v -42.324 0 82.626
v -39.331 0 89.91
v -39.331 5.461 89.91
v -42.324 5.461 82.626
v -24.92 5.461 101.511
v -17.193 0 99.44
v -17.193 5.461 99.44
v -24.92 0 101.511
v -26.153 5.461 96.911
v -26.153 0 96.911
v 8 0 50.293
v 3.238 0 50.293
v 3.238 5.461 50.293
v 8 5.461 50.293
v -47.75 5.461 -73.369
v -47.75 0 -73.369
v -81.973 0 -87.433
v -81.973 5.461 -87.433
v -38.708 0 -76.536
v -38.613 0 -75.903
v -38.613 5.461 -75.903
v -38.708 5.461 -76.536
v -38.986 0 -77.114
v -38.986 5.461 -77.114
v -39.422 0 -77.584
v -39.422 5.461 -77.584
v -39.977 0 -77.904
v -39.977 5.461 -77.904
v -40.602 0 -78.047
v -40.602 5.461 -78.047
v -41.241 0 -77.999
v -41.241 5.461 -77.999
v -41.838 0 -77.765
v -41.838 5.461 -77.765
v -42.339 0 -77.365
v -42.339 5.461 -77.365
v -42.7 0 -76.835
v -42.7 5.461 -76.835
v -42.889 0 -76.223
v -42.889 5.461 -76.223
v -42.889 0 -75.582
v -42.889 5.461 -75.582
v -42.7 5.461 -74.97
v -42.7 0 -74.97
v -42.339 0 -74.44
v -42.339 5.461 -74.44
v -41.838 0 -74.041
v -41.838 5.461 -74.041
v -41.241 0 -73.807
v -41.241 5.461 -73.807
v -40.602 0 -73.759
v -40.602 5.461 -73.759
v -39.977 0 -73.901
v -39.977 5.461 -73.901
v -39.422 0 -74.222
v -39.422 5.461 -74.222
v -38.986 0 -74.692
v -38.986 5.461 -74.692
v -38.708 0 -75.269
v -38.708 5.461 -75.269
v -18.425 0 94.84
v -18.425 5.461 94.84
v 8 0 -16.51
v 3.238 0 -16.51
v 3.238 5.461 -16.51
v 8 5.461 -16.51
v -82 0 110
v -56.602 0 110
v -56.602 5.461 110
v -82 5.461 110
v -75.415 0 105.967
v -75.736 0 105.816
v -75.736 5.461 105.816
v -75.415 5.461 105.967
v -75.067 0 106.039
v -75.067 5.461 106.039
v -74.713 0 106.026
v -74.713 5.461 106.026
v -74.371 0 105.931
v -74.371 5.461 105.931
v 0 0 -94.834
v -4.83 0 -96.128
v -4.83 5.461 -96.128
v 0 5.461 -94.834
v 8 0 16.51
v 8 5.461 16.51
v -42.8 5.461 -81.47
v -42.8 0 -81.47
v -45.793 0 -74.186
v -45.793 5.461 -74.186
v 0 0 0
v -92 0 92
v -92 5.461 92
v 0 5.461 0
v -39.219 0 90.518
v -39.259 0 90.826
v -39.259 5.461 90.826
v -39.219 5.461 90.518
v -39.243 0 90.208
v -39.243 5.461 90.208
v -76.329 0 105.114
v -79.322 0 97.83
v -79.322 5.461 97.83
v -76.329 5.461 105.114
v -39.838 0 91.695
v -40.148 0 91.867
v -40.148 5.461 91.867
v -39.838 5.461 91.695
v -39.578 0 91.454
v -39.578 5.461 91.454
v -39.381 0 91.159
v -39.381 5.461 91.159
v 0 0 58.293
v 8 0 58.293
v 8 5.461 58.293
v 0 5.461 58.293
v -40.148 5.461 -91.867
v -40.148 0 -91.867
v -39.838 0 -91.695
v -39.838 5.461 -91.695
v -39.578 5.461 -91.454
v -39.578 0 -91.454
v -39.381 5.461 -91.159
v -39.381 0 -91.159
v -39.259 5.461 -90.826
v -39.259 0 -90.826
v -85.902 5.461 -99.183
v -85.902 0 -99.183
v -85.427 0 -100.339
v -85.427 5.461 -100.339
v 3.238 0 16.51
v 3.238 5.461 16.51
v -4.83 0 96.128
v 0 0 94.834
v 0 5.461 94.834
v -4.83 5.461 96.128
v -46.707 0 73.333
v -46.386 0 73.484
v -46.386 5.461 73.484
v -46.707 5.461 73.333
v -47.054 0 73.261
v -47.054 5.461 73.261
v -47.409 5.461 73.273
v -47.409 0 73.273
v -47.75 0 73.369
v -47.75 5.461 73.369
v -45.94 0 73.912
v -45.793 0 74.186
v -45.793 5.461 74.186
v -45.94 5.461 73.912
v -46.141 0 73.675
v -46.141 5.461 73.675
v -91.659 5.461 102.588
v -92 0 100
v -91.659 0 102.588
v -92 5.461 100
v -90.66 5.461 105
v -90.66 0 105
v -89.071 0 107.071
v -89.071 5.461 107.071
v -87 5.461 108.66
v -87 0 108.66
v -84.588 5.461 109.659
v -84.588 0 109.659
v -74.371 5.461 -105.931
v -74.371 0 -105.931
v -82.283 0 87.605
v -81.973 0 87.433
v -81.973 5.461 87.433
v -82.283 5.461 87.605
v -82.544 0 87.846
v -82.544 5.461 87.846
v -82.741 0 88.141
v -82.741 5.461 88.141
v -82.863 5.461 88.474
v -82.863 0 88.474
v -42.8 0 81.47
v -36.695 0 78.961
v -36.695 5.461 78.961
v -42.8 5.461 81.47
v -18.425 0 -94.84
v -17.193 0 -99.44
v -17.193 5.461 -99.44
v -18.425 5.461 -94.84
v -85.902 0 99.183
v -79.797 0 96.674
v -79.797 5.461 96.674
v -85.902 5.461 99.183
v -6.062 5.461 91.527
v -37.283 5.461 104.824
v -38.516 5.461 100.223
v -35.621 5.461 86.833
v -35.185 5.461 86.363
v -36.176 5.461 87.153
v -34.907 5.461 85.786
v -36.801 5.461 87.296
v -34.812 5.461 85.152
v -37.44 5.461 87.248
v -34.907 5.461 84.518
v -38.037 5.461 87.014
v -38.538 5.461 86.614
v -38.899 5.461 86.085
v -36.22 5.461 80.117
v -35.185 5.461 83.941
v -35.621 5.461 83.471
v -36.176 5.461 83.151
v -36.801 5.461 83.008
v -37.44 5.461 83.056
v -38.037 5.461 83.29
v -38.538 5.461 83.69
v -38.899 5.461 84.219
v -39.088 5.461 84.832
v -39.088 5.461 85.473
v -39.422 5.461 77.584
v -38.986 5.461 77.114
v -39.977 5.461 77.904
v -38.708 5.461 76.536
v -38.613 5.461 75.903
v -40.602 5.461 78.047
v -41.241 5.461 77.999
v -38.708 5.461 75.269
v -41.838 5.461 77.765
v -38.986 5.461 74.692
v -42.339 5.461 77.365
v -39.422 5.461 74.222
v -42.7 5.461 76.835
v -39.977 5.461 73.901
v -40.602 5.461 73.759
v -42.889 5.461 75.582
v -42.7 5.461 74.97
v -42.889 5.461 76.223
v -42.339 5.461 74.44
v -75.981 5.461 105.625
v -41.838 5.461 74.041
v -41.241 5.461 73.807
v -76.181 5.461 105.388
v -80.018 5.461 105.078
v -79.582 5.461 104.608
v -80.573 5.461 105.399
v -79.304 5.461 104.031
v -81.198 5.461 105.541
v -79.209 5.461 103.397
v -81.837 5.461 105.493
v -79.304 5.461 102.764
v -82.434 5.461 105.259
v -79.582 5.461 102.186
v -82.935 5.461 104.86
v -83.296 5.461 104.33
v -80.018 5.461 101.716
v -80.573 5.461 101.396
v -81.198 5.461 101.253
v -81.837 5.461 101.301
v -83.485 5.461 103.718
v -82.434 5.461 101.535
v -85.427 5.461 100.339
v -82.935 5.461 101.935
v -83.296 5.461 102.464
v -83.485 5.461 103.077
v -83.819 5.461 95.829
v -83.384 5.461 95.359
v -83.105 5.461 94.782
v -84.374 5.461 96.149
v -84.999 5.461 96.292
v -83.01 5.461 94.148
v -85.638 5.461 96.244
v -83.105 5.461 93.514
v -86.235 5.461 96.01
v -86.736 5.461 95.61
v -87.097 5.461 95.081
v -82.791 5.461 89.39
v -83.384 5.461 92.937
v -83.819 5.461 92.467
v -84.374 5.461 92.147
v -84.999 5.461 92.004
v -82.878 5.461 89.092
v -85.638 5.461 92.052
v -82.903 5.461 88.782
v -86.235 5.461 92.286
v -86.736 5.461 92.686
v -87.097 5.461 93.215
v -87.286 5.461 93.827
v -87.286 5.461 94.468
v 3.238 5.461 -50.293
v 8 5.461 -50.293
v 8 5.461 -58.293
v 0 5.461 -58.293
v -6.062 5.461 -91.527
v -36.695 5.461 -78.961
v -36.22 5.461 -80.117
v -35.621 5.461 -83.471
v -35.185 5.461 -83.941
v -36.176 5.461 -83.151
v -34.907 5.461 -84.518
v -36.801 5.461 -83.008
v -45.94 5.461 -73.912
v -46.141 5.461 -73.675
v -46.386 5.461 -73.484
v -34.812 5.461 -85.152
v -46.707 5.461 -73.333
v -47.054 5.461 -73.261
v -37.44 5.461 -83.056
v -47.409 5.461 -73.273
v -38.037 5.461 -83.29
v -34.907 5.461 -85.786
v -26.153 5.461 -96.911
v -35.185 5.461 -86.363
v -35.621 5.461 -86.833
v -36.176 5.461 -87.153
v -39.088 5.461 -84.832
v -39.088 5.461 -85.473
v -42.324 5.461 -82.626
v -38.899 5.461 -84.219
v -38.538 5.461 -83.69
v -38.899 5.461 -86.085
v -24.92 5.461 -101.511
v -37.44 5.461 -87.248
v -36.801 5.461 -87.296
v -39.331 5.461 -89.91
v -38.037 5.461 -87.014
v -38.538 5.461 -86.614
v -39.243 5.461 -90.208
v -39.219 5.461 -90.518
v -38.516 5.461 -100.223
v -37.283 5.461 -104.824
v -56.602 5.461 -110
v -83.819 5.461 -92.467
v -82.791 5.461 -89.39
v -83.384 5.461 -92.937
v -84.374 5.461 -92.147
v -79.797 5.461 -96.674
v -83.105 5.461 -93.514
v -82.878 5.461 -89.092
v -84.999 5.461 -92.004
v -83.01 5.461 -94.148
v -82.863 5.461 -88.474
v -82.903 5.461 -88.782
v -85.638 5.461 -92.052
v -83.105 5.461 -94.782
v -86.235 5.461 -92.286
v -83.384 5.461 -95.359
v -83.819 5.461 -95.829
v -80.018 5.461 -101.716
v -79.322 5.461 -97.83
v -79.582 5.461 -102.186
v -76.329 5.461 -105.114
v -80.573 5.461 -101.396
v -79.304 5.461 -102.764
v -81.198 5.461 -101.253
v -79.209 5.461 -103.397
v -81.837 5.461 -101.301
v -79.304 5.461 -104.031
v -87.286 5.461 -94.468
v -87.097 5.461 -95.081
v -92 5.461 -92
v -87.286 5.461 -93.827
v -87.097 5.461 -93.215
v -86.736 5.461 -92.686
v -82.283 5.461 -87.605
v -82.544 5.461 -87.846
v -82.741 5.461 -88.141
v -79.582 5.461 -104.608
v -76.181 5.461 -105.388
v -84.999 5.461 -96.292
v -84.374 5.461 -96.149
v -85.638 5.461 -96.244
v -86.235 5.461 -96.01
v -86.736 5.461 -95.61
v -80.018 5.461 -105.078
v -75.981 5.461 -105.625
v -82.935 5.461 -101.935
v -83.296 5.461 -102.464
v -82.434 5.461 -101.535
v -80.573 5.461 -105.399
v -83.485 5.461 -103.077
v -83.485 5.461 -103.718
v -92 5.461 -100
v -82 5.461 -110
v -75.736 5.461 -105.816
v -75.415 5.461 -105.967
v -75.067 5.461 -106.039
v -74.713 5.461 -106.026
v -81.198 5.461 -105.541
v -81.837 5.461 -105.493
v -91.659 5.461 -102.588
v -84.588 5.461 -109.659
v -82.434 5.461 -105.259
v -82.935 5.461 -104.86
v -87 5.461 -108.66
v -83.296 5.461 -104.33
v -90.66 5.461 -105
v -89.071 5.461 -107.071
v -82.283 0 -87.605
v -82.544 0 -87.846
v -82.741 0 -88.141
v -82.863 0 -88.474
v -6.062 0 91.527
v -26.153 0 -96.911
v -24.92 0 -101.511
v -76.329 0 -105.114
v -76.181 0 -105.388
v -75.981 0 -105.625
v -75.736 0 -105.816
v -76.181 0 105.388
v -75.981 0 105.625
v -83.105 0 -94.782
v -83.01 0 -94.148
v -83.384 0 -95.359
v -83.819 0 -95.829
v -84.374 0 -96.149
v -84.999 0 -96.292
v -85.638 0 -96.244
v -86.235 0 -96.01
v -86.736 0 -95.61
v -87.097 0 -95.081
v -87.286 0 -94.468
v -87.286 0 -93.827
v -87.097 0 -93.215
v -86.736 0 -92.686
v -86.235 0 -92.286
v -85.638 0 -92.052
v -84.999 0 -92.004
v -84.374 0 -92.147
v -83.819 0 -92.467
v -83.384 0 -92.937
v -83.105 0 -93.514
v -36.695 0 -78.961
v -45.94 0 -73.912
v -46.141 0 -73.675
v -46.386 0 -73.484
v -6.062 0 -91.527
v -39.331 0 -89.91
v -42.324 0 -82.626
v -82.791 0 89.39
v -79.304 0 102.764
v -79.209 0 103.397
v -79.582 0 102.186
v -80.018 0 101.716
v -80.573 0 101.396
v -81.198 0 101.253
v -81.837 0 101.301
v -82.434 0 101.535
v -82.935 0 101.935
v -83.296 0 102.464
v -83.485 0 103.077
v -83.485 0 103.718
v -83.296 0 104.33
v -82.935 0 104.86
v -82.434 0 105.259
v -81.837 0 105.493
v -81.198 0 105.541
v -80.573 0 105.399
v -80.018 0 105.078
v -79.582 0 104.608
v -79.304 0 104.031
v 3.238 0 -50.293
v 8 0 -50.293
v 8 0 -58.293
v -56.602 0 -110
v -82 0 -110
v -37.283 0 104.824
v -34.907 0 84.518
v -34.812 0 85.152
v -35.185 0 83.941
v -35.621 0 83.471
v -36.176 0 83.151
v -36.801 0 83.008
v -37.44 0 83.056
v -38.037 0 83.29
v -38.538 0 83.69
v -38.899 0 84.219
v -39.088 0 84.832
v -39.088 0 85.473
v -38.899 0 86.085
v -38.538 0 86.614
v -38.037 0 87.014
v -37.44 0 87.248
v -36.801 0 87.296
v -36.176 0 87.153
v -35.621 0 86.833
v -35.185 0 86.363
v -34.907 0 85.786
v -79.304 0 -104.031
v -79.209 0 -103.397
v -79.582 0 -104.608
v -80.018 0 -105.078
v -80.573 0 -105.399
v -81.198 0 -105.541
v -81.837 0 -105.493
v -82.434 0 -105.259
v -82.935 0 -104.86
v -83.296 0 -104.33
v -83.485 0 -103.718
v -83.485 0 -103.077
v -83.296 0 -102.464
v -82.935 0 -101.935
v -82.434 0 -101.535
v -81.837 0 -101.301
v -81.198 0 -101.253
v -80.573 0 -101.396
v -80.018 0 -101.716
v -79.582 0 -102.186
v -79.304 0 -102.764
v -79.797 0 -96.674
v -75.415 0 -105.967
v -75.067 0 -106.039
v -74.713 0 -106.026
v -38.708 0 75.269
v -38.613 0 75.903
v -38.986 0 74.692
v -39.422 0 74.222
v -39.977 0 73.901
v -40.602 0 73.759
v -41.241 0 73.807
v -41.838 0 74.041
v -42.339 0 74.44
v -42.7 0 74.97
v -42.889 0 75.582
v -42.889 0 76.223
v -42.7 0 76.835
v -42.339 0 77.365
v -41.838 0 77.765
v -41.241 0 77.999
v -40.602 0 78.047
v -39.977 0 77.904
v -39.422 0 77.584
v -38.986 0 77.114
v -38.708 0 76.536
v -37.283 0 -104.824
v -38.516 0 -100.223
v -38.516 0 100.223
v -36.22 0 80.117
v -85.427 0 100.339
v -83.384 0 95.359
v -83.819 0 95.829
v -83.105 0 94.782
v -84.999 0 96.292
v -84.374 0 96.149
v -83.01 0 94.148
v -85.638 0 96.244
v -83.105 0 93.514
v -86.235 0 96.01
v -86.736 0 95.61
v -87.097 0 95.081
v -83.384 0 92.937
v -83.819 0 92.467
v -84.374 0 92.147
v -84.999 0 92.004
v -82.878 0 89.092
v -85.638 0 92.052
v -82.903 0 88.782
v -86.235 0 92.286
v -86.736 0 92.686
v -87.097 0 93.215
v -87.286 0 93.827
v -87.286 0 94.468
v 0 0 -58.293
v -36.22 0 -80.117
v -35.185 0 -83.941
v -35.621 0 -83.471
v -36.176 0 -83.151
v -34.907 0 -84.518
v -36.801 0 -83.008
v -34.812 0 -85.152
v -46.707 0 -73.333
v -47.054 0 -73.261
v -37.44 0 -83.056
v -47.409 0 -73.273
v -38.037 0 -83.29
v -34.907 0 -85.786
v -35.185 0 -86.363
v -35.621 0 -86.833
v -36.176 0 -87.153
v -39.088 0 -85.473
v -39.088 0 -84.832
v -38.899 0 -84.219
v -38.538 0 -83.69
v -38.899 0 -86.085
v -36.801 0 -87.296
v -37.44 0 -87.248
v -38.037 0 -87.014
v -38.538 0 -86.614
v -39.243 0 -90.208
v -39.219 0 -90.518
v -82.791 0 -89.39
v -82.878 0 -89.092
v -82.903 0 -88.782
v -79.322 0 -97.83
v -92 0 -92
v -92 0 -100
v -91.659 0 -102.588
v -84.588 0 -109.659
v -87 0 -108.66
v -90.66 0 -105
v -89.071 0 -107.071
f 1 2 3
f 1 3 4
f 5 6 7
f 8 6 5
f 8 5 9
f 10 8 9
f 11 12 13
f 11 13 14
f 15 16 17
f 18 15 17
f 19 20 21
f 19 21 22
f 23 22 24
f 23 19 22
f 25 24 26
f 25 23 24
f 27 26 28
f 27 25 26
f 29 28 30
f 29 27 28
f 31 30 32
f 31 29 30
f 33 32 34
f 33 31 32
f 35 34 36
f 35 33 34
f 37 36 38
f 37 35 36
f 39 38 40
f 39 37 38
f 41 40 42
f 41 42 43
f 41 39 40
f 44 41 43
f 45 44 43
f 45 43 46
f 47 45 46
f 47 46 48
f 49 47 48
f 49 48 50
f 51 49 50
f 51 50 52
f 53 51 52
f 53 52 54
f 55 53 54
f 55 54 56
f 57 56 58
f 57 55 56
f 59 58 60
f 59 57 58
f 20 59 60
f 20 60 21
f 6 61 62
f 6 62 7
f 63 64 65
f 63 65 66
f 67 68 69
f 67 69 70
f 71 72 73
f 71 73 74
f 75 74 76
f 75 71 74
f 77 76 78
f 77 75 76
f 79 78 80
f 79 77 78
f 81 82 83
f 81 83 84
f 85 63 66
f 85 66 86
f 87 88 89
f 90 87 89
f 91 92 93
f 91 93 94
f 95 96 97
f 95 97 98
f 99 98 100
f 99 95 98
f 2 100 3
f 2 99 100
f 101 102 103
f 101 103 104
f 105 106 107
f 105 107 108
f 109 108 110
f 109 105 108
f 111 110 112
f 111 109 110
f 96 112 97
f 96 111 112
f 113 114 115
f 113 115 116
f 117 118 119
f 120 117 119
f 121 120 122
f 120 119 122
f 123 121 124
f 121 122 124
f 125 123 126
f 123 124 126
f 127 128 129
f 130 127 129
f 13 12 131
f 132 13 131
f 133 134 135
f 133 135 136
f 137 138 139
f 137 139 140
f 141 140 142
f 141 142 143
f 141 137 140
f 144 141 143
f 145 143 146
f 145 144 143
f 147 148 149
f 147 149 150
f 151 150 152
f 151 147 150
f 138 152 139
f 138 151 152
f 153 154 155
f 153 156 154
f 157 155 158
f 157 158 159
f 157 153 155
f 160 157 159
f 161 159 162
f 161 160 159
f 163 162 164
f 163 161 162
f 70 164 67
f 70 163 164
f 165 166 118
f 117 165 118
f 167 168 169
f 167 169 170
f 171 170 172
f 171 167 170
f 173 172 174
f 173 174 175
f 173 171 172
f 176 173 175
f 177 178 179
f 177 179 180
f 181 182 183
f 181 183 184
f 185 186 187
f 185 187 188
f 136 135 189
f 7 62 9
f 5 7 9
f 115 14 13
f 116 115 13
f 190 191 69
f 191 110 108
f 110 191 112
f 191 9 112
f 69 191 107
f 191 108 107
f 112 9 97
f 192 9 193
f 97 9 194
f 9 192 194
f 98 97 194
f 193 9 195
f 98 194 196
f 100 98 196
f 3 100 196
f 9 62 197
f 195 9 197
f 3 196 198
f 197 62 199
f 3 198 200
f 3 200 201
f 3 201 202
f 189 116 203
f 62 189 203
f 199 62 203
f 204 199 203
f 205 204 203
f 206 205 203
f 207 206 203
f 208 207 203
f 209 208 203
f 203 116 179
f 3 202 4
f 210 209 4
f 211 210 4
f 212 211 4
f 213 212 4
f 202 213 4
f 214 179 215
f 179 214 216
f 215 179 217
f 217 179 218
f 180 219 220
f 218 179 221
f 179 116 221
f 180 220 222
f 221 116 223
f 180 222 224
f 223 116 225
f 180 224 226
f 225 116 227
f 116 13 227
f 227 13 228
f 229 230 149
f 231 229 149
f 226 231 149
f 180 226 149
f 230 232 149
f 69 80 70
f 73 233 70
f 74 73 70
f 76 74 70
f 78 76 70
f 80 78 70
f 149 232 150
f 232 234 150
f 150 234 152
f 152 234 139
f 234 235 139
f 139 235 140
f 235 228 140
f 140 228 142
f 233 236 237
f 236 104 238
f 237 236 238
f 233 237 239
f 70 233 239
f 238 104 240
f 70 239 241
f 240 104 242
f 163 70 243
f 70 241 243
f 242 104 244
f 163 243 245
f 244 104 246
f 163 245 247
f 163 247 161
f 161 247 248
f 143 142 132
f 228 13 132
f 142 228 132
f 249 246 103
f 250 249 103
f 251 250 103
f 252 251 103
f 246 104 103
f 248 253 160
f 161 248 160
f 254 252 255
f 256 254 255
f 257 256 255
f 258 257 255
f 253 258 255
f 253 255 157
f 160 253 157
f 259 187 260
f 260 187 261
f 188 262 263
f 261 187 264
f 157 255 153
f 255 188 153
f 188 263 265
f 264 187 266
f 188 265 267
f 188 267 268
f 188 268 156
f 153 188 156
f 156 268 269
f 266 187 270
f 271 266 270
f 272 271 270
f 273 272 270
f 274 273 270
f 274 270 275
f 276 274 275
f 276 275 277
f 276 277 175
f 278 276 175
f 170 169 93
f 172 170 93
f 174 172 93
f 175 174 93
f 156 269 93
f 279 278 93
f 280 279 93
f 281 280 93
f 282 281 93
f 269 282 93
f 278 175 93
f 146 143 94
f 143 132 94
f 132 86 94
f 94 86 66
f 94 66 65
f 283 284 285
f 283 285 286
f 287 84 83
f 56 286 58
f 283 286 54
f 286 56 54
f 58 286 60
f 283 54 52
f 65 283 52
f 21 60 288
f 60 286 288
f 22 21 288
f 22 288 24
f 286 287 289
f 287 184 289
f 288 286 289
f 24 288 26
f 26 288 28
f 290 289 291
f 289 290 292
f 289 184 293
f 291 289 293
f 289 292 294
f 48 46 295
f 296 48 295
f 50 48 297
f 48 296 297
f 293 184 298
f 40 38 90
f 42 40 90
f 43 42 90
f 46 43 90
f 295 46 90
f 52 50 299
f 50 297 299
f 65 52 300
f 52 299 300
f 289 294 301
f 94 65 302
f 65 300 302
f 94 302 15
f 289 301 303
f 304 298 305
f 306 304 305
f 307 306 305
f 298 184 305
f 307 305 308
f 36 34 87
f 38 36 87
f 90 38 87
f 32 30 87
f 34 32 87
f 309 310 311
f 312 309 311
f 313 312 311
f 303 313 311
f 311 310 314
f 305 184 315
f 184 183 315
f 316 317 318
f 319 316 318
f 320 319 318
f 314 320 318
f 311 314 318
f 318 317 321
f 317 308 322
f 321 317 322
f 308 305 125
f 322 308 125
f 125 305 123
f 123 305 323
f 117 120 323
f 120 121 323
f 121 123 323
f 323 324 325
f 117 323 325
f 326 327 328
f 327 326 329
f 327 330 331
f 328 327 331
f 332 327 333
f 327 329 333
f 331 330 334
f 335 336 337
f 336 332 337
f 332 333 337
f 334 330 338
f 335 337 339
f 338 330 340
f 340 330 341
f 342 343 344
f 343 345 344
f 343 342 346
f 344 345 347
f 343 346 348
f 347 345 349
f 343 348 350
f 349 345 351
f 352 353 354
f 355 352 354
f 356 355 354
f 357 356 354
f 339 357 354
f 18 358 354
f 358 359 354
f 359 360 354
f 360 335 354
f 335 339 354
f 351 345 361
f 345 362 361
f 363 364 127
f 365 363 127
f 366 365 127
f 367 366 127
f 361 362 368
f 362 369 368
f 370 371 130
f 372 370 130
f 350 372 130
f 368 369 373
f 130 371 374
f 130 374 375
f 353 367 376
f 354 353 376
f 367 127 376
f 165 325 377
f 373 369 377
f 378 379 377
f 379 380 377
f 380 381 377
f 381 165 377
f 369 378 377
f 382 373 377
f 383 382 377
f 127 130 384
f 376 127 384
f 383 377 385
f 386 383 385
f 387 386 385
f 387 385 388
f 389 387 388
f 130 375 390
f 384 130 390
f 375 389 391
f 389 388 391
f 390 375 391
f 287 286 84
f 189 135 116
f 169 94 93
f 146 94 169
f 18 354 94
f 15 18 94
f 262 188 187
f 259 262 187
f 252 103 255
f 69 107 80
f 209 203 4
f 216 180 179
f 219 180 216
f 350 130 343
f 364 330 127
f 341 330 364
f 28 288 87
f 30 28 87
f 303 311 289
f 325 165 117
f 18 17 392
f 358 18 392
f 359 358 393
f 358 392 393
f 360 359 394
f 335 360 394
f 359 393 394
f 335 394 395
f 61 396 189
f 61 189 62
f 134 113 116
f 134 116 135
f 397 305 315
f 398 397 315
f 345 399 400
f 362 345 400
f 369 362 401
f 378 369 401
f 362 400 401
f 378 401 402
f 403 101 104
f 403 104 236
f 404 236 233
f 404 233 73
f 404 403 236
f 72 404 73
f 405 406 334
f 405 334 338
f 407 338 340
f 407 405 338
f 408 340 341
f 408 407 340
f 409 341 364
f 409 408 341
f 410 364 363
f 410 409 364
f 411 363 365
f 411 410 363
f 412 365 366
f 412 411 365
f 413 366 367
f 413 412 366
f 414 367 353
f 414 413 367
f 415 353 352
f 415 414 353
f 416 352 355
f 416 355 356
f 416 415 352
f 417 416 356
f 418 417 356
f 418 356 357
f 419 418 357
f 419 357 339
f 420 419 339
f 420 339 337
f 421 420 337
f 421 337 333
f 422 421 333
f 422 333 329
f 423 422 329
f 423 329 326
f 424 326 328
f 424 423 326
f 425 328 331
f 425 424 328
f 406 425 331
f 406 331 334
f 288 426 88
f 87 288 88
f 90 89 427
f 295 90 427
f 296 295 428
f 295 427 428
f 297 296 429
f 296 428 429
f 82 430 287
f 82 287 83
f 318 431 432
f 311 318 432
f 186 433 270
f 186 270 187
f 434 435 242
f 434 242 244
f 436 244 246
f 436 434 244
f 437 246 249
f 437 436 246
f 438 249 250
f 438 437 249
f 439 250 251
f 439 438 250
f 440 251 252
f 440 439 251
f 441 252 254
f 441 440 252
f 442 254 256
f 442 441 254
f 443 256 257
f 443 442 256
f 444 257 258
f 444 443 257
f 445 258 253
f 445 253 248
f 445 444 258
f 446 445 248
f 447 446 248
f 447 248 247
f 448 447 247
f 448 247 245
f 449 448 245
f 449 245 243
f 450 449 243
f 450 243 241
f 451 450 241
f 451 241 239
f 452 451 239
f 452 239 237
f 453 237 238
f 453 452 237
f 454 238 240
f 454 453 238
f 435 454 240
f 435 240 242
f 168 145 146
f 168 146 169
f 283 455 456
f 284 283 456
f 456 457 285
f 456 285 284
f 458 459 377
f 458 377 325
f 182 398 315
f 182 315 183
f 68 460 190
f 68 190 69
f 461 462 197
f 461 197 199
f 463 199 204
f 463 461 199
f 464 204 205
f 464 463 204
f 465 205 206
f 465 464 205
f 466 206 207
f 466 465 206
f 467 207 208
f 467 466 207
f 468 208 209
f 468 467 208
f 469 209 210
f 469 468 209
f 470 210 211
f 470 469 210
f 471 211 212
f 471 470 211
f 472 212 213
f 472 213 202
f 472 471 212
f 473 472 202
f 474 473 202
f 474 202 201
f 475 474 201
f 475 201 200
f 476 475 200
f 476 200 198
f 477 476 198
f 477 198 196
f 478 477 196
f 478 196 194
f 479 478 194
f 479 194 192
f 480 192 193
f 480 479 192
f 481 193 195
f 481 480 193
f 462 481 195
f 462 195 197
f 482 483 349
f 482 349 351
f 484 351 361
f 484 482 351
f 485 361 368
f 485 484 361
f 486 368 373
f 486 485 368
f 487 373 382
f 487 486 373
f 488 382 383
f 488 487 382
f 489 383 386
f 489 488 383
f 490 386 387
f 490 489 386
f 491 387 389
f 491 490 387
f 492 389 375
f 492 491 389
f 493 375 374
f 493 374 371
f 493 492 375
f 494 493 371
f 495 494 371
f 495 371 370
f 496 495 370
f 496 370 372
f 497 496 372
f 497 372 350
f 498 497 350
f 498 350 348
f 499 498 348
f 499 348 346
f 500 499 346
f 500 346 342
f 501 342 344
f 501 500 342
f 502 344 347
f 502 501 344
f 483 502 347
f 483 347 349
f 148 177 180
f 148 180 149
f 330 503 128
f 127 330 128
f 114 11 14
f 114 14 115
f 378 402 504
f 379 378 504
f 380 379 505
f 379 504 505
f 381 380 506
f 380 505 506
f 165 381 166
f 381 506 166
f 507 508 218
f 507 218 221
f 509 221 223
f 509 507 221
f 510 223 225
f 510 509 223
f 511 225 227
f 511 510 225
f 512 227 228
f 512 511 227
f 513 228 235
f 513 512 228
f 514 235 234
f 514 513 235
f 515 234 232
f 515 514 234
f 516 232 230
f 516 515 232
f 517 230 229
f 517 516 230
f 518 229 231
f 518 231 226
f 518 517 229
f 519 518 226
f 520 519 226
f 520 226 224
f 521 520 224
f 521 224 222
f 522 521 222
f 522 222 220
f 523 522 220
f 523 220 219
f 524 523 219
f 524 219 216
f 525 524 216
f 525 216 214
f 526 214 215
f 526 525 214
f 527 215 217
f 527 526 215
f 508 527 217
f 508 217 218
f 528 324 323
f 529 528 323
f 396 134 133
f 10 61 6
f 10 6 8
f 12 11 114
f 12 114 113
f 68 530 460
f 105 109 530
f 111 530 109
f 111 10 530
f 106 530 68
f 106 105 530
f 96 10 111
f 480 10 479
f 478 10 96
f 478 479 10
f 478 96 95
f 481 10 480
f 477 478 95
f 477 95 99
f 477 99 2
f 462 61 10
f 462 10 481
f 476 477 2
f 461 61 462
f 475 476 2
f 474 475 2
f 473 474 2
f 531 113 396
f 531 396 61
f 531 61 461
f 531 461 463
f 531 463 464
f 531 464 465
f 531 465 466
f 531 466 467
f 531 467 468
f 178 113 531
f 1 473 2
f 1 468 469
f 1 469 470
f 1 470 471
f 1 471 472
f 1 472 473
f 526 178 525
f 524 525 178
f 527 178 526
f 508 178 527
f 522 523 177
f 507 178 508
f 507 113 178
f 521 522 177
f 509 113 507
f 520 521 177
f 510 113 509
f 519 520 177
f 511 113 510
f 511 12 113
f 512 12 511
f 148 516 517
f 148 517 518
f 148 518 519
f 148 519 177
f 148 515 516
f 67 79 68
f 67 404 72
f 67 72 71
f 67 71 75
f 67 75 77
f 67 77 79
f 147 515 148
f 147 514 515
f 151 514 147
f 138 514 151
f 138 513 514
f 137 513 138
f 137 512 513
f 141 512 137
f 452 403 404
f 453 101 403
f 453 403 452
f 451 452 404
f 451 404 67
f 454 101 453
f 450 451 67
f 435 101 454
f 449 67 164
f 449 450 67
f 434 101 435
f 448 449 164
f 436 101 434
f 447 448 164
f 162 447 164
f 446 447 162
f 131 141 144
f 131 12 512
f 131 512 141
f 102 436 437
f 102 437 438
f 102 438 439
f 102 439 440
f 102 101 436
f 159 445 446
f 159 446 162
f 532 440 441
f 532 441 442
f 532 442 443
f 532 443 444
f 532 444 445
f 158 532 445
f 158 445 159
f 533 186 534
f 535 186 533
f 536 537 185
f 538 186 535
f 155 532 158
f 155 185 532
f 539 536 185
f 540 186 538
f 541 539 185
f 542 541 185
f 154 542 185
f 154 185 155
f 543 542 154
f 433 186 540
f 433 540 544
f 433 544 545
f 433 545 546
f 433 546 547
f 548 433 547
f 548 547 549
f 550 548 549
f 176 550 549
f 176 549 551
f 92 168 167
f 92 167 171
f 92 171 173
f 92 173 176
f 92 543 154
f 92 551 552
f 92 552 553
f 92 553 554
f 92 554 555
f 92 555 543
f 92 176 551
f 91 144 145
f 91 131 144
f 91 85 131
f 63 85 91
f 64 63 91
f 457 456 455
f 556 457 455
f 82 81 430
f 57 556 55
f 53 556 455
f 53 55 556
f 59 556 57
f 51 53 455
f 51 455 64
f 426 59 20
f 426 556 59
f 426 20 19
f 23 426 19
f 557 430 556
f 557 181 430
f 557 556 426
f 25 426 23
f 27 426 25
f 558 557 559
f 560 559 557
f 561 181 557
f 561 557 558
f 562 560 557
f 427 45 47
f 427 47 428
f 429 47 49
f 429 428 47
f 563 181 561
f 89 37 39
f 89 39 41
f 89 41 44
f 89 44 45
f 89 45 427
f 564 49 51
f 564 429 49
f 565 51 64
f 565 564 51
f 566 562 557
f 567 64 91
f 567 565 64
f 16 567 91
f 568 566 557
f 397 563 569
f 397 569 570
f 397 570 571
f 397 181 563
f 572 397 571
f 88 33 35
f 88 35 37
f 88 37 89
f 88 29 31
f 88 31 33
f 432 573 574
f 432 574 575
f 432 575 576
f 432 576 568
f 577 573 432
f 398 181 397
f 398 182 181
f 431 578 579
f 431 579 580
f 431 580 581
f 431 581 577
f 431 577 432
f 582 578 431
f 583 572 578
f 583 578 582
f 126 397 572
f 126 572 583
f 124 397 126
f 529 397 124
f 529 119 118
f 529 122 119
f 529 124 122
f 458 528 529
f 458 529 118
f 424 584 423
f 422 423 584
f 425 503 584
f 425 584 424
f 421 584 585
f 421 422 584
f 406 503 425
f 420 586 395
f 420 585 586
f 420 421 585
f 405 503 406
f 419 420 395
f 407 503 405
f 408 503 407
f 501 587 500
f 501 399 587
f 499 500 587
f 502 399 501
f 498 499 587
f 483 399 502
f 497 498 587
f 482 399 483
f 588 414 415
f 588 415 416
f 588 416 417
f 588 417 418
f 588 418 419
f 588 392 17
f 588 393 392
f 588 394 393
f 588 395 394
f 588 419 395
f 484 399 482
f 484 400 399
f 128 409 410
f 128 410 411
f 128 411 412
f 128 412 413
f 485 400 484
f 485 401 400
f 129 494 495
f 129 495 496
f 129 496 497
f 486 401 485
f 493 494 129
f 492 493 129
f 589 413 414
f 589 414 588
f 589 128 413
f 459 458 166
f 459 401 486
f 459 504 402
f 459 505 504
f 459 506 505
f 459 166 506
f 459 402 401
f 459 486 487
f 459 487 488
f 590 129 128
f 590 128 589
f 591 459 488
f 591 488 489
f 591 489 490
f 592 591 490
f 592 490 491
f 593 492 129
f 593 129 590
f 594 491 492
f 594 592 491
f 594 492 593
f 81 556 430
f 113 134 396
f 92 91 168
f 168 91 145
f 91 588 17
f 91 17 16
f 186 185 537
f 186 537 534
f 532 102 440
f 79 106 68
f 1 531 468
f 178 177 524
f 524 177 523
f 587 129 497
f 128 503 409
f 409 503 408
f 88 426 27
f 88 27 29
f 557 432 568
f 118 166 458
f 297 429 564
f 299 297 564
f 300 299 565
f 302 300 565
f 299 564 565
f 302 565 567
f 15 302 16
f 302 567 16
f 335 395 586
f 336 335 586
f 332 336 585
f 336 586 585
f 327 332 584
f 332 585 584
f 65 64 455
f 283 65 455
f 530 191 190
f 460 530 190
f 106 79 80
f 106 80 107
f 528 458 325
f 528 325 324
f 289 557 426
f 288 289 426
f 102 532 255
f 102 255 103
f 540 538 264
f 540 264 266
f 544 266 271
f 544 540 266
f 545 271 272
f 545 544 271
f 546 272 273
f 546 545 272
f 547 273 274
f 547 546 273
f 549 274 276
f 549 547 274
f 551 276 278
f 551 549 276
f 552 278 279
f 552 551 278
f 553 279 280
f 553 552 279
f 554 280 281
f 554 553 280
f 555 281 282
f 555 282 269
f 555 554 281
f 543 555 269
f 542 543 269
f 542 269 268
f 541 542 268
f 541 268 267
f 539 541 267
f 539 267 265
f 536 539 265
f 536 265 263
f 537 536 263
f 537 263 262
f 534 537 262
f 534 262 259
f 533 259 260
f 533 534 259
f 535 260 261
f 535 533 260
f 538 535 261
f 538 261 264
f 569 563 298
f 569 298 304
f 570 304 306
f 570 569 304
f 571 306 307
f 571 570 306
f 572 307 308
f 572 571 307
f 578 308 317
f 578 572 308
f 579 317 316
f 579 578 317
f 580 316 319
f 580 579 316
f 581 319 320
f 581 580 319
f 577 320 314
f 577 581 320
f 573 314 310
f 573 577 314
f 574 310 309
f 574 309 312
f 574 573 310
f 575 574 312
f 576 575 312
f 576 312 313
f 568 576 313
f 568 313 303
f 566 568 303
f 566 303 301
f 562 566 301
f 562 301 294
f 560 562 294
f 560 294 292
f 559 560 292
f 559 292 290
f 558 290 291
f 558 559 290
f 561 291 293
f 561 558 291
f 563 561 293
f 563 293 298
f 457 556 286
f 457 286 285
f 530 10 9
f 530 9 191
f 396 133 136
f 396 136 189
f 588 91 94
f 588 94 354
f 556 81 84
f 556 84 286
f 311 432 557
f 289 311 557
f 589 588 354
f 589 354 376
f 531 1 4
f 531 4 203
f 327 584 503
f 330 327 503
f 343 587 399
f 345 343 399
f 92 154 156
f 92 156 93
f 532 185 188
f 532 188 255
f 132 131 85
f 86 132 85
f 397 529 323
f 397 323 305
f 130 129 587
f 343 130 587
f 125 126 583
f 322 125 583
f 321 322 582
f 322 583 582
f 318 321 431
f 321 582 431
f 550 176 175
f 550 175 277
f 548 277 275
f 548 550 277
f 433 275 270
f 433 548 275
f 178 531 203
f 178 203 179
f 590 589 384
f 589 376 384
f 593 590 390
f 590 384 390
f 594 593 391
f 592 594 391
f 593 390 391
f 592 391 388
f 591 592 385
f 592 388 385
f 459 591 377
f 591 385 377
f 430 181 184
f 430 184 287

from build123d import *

# Parameters (mm, degrees)
SKETCH1_R           = 2.15
BOSS_EXTRUDE1_DEPTH = 5.461
FILLET1_R           = 10
SKETCH2_W           = 4.7625
SKETCH2_H           = 33.783
CUT_EXTRUDE1_DEPTH  = 10


with BuildPart() as part:
    # Sketch1 → Boss-Extrude1 (new body)
    with BuildSketch(Plane(origin=(0, 0, 0), x_dir=(1, 0, 0), z_dir=(0, 1, 0))):
        Polygon((0, 0), (-92, 92), (-92, 110), (-56.601944845, 110), (0, 94.833554589), (0, 58.293), (8, 58.293), (8, -58.293), (0, -58.293), (0, -94.833554589), (-56.601944845, -110), (-92, -110), (-92, -92), align=None)
        with Locations((-85.159917522, 94.147890435)):
            Circle(SKETCH1_R, mode=Mode.SUBTRACT)
        with Locations((-81.358825255, 103.397306502)):
            Circle(SKETCH1_R, mode=Mode.SUBTRACT)
        with Locations((-36.961628134, 85.152063619)):
            Circle(SKETCH1_R, mode=Mode.SUBTRACT)
        with Locations((-40.762720402, 75.902647552)):
            Circle(SKETCH1_R, mode=Mode.SUBTRACT)
        with Locations((-40.762720402, -75.902647552)):
            Circle(SKETCH1_R, mode=Mode.SUBTRACT)
        with Locations((-36.961628134, -85.152063619)):
            Circle(SKETCH1_R, mode=Mode.SUBTRACT)
        with Locations((-81.358825255, -103.397306502)):
            Circle(SKETCH1_R, mode=Mode.SUBTRACT)
        with Locations((-85.159917522, -94.147890435)):
            Circle(SKETCH1_R, mode=Mode.SUBTRACT)
        with BuildLine():
            Line((-79.322036695, 97.830250065), (-76.328676535, 105.114165218))
            ThreePointArc((-76.328676535, 105.114165218), (-76.087243425, 105.511850251), (-75.735570504, 105.816431091))
            ThreePointArc((-75.735570504, 105.816431091), (-75.067221358, 106.038703614), (-74.371100284, 105.931413788))
            Line((-74.371100284, 105.931413788), (-40.148260837, 91.867372399))
            ThreePointArc((-40.148260837, 91.867372399), (-39.577853455, 91.454176231), (-39.258927152, 90.826178087))
            ThreePointArc((-39.258927152, 90.826178087), (-39.223044121, 90.362329254), (-39.331012268, 89.909796149))
            Line((-39.331012268, 89.909796149), (-42.324372428, 82.625880996))
            Line((-42.324372428, 82.625880996), (-36.219757824, 80.1171601))
            Line((-36.219757824, 80.1171601), (-36.694894357, 78.960983092))
            Line((-36.694894357, 78.960983092), (-42.799508961, 81.469703988))
            Line((-42.799508961, 81.469703988), (-45.792869122, 74.185788836))
            ThreePointArc((-45.792869122, 74.185788836), (-46.034302231, 73.788103802), (-46.385975153, 73.483522962))
            ThreePointArc((-46.385975153, 73.483522962), (-47.054324299, 73.261250439), (-47.750445372, 73.368540266))
            Line((-47.750445372, 73.368540266), (-81.973284819, 87.432581654))
            ThreePointArc((-81.973284819, 87.432581654), (-82.543692202, 87.845777823), (-82.862618505, 88.473775966))
            ThreePointArc((-82.862618505, 88.473775966), (-82.898501536, 88.937624799), (-82.790533389, 89.390157905))
            Line((-82.790533389, 89.390157905), (-79.797173228, 96.674073057))
            Line((-79.797173228, 96.674073057), (-85.901787832, 99.182793954))
            Line((-85.901787832, 99.182793954), (-85.426651299, 100.338970962))
            Line((-85.426651299, 100.338970962), (-79.322036695, 97.830250065))
        make_face(mode=Mode.SUBTRACT)
        with BuildLine():
            Line((-47.750445372, -73.368540266), (-81.973284819, -87.432581654))
            ThreePointArc((-81.973284819, -87.432581654), (-82.543692202, -87.845777823), (-82.862618505, -88.473775966))
            ThreePointArc((-82.862618505, -88.473775966), (-82.898501536, -88.937624799), (-82.790533389, -89.390157905))
            Line((-82.790533389, -89.390157905), (-79.797173228, -96.674073057))
            Line((-79.797173228, -96.674073057), (-85.901787832, -99.182793954))
            Line((-85.901787832, -99.182793954), (-85.426651299, -100.338970962))
            Line((-85.426651299, -100.338970962), (-79.322036695, -97.830250065))
            Line((-79.322036695, -97.830250065), (-76.328676535, -105.114165218))
            ThreePointArc((-76.328676535, -105.114165218), (-76.087243425, -105.511850251), (-75.735570504, -105.816431091))
            ThreePointArc((-75.735570504, -105.816431091), (-75.067221358, -106.038703614), (-74.371100284, -105.931413788))
            Line((-74.371100284, -105.931413788), (-40.148260837, -91.867372399))
            ThreePointArc((-40.148260837, -91.867372399), (-39.577853455, -91.454176231), (-39.258927152, -90.826178087))
            ThreePointArc((-39.258927152, -90.826178087), (-39.223044121, -90.362329254), (-39.331012268, -89.909796149))
            Line((-39.331012268, -89.909796149), (-42.324372428, -82.625880996))
            Line((-42.324372428, -82.625880996), (-36.219757824, -80.1171601))
            Line((-36.219757824, -80.1171601), (-36.694894357, -78.960983092))
            Line((-36.694894357, -78.960983092), (-42.799508961, -81.469703988))
            Line((-42.799508961, -81.469703988), (-45.792869122, -74.185788836))
            ThreePointArc((-45.792869122, -74.185788836), (-46.034302231, -73.788103802), (-46.385975153, -73.483522962))
            ThreePointArc((-46.385975153, -73.483522962), (-47.054324299, -73.261250439), (-47.750445372, -73.368540266))
        make_face(mode=Mode.SUBTRACT)
    extrude(amount=BOSS_EXTRUDE1_DEPTH)

    # Fillet1
    fillet1_edges = [part.edges().sort_by_distance(p)[0] for p in [
        (-92, 2.7305, -110),
        (-92, 2.7305, 110),
    ]]
    fillet(fillet1_edges, radius=FILLET1_R)

    # Sketch2 → Cut-Extrude1 (cut)
    with BuildSketch(Plane(origin=(0, 0, 0), x_dir=(1, 0, 0), z_dir=(0, 1, 0))):
        Polygon((-4.829629131, 96.127649814), (-17.19282542, 99.440358276), (-18.425451123, 94.840136528), (-6.062254834, 91.527428067), align=None)
        Polygon((-24.920232031, 101.510910637), (-37.283428319, 104.823619098), (-38.516054022, 100.22339735), (-26.152857733, 96.910688889), align=None)
        Polygon((-26.152857733, -96.910688889), (-38.516054022, -100.22339735), (-37.283428319, -104.823619098), (-24.920232031, -101.510910637), align=None)
        Polygon((-6.062254834, -91.527428067), (-18.425451123, -94.840136528), (-17.19282542, -99.440358276), (-4.829629131, -96.127649814), align=None)
        with Locations((5.61875, 33.4015)):
            Rectangle(SKETCH2_W, SKETCH2_H)
        with Locations((5.61875, -33.4015)):
            Rectangle(SKETCH2_W, SKETCH2_H)
    extrude(amount=CUT_EXTRUDE1_DEPTH, mode=Mode.SUBTRACT)


solid = part.part
